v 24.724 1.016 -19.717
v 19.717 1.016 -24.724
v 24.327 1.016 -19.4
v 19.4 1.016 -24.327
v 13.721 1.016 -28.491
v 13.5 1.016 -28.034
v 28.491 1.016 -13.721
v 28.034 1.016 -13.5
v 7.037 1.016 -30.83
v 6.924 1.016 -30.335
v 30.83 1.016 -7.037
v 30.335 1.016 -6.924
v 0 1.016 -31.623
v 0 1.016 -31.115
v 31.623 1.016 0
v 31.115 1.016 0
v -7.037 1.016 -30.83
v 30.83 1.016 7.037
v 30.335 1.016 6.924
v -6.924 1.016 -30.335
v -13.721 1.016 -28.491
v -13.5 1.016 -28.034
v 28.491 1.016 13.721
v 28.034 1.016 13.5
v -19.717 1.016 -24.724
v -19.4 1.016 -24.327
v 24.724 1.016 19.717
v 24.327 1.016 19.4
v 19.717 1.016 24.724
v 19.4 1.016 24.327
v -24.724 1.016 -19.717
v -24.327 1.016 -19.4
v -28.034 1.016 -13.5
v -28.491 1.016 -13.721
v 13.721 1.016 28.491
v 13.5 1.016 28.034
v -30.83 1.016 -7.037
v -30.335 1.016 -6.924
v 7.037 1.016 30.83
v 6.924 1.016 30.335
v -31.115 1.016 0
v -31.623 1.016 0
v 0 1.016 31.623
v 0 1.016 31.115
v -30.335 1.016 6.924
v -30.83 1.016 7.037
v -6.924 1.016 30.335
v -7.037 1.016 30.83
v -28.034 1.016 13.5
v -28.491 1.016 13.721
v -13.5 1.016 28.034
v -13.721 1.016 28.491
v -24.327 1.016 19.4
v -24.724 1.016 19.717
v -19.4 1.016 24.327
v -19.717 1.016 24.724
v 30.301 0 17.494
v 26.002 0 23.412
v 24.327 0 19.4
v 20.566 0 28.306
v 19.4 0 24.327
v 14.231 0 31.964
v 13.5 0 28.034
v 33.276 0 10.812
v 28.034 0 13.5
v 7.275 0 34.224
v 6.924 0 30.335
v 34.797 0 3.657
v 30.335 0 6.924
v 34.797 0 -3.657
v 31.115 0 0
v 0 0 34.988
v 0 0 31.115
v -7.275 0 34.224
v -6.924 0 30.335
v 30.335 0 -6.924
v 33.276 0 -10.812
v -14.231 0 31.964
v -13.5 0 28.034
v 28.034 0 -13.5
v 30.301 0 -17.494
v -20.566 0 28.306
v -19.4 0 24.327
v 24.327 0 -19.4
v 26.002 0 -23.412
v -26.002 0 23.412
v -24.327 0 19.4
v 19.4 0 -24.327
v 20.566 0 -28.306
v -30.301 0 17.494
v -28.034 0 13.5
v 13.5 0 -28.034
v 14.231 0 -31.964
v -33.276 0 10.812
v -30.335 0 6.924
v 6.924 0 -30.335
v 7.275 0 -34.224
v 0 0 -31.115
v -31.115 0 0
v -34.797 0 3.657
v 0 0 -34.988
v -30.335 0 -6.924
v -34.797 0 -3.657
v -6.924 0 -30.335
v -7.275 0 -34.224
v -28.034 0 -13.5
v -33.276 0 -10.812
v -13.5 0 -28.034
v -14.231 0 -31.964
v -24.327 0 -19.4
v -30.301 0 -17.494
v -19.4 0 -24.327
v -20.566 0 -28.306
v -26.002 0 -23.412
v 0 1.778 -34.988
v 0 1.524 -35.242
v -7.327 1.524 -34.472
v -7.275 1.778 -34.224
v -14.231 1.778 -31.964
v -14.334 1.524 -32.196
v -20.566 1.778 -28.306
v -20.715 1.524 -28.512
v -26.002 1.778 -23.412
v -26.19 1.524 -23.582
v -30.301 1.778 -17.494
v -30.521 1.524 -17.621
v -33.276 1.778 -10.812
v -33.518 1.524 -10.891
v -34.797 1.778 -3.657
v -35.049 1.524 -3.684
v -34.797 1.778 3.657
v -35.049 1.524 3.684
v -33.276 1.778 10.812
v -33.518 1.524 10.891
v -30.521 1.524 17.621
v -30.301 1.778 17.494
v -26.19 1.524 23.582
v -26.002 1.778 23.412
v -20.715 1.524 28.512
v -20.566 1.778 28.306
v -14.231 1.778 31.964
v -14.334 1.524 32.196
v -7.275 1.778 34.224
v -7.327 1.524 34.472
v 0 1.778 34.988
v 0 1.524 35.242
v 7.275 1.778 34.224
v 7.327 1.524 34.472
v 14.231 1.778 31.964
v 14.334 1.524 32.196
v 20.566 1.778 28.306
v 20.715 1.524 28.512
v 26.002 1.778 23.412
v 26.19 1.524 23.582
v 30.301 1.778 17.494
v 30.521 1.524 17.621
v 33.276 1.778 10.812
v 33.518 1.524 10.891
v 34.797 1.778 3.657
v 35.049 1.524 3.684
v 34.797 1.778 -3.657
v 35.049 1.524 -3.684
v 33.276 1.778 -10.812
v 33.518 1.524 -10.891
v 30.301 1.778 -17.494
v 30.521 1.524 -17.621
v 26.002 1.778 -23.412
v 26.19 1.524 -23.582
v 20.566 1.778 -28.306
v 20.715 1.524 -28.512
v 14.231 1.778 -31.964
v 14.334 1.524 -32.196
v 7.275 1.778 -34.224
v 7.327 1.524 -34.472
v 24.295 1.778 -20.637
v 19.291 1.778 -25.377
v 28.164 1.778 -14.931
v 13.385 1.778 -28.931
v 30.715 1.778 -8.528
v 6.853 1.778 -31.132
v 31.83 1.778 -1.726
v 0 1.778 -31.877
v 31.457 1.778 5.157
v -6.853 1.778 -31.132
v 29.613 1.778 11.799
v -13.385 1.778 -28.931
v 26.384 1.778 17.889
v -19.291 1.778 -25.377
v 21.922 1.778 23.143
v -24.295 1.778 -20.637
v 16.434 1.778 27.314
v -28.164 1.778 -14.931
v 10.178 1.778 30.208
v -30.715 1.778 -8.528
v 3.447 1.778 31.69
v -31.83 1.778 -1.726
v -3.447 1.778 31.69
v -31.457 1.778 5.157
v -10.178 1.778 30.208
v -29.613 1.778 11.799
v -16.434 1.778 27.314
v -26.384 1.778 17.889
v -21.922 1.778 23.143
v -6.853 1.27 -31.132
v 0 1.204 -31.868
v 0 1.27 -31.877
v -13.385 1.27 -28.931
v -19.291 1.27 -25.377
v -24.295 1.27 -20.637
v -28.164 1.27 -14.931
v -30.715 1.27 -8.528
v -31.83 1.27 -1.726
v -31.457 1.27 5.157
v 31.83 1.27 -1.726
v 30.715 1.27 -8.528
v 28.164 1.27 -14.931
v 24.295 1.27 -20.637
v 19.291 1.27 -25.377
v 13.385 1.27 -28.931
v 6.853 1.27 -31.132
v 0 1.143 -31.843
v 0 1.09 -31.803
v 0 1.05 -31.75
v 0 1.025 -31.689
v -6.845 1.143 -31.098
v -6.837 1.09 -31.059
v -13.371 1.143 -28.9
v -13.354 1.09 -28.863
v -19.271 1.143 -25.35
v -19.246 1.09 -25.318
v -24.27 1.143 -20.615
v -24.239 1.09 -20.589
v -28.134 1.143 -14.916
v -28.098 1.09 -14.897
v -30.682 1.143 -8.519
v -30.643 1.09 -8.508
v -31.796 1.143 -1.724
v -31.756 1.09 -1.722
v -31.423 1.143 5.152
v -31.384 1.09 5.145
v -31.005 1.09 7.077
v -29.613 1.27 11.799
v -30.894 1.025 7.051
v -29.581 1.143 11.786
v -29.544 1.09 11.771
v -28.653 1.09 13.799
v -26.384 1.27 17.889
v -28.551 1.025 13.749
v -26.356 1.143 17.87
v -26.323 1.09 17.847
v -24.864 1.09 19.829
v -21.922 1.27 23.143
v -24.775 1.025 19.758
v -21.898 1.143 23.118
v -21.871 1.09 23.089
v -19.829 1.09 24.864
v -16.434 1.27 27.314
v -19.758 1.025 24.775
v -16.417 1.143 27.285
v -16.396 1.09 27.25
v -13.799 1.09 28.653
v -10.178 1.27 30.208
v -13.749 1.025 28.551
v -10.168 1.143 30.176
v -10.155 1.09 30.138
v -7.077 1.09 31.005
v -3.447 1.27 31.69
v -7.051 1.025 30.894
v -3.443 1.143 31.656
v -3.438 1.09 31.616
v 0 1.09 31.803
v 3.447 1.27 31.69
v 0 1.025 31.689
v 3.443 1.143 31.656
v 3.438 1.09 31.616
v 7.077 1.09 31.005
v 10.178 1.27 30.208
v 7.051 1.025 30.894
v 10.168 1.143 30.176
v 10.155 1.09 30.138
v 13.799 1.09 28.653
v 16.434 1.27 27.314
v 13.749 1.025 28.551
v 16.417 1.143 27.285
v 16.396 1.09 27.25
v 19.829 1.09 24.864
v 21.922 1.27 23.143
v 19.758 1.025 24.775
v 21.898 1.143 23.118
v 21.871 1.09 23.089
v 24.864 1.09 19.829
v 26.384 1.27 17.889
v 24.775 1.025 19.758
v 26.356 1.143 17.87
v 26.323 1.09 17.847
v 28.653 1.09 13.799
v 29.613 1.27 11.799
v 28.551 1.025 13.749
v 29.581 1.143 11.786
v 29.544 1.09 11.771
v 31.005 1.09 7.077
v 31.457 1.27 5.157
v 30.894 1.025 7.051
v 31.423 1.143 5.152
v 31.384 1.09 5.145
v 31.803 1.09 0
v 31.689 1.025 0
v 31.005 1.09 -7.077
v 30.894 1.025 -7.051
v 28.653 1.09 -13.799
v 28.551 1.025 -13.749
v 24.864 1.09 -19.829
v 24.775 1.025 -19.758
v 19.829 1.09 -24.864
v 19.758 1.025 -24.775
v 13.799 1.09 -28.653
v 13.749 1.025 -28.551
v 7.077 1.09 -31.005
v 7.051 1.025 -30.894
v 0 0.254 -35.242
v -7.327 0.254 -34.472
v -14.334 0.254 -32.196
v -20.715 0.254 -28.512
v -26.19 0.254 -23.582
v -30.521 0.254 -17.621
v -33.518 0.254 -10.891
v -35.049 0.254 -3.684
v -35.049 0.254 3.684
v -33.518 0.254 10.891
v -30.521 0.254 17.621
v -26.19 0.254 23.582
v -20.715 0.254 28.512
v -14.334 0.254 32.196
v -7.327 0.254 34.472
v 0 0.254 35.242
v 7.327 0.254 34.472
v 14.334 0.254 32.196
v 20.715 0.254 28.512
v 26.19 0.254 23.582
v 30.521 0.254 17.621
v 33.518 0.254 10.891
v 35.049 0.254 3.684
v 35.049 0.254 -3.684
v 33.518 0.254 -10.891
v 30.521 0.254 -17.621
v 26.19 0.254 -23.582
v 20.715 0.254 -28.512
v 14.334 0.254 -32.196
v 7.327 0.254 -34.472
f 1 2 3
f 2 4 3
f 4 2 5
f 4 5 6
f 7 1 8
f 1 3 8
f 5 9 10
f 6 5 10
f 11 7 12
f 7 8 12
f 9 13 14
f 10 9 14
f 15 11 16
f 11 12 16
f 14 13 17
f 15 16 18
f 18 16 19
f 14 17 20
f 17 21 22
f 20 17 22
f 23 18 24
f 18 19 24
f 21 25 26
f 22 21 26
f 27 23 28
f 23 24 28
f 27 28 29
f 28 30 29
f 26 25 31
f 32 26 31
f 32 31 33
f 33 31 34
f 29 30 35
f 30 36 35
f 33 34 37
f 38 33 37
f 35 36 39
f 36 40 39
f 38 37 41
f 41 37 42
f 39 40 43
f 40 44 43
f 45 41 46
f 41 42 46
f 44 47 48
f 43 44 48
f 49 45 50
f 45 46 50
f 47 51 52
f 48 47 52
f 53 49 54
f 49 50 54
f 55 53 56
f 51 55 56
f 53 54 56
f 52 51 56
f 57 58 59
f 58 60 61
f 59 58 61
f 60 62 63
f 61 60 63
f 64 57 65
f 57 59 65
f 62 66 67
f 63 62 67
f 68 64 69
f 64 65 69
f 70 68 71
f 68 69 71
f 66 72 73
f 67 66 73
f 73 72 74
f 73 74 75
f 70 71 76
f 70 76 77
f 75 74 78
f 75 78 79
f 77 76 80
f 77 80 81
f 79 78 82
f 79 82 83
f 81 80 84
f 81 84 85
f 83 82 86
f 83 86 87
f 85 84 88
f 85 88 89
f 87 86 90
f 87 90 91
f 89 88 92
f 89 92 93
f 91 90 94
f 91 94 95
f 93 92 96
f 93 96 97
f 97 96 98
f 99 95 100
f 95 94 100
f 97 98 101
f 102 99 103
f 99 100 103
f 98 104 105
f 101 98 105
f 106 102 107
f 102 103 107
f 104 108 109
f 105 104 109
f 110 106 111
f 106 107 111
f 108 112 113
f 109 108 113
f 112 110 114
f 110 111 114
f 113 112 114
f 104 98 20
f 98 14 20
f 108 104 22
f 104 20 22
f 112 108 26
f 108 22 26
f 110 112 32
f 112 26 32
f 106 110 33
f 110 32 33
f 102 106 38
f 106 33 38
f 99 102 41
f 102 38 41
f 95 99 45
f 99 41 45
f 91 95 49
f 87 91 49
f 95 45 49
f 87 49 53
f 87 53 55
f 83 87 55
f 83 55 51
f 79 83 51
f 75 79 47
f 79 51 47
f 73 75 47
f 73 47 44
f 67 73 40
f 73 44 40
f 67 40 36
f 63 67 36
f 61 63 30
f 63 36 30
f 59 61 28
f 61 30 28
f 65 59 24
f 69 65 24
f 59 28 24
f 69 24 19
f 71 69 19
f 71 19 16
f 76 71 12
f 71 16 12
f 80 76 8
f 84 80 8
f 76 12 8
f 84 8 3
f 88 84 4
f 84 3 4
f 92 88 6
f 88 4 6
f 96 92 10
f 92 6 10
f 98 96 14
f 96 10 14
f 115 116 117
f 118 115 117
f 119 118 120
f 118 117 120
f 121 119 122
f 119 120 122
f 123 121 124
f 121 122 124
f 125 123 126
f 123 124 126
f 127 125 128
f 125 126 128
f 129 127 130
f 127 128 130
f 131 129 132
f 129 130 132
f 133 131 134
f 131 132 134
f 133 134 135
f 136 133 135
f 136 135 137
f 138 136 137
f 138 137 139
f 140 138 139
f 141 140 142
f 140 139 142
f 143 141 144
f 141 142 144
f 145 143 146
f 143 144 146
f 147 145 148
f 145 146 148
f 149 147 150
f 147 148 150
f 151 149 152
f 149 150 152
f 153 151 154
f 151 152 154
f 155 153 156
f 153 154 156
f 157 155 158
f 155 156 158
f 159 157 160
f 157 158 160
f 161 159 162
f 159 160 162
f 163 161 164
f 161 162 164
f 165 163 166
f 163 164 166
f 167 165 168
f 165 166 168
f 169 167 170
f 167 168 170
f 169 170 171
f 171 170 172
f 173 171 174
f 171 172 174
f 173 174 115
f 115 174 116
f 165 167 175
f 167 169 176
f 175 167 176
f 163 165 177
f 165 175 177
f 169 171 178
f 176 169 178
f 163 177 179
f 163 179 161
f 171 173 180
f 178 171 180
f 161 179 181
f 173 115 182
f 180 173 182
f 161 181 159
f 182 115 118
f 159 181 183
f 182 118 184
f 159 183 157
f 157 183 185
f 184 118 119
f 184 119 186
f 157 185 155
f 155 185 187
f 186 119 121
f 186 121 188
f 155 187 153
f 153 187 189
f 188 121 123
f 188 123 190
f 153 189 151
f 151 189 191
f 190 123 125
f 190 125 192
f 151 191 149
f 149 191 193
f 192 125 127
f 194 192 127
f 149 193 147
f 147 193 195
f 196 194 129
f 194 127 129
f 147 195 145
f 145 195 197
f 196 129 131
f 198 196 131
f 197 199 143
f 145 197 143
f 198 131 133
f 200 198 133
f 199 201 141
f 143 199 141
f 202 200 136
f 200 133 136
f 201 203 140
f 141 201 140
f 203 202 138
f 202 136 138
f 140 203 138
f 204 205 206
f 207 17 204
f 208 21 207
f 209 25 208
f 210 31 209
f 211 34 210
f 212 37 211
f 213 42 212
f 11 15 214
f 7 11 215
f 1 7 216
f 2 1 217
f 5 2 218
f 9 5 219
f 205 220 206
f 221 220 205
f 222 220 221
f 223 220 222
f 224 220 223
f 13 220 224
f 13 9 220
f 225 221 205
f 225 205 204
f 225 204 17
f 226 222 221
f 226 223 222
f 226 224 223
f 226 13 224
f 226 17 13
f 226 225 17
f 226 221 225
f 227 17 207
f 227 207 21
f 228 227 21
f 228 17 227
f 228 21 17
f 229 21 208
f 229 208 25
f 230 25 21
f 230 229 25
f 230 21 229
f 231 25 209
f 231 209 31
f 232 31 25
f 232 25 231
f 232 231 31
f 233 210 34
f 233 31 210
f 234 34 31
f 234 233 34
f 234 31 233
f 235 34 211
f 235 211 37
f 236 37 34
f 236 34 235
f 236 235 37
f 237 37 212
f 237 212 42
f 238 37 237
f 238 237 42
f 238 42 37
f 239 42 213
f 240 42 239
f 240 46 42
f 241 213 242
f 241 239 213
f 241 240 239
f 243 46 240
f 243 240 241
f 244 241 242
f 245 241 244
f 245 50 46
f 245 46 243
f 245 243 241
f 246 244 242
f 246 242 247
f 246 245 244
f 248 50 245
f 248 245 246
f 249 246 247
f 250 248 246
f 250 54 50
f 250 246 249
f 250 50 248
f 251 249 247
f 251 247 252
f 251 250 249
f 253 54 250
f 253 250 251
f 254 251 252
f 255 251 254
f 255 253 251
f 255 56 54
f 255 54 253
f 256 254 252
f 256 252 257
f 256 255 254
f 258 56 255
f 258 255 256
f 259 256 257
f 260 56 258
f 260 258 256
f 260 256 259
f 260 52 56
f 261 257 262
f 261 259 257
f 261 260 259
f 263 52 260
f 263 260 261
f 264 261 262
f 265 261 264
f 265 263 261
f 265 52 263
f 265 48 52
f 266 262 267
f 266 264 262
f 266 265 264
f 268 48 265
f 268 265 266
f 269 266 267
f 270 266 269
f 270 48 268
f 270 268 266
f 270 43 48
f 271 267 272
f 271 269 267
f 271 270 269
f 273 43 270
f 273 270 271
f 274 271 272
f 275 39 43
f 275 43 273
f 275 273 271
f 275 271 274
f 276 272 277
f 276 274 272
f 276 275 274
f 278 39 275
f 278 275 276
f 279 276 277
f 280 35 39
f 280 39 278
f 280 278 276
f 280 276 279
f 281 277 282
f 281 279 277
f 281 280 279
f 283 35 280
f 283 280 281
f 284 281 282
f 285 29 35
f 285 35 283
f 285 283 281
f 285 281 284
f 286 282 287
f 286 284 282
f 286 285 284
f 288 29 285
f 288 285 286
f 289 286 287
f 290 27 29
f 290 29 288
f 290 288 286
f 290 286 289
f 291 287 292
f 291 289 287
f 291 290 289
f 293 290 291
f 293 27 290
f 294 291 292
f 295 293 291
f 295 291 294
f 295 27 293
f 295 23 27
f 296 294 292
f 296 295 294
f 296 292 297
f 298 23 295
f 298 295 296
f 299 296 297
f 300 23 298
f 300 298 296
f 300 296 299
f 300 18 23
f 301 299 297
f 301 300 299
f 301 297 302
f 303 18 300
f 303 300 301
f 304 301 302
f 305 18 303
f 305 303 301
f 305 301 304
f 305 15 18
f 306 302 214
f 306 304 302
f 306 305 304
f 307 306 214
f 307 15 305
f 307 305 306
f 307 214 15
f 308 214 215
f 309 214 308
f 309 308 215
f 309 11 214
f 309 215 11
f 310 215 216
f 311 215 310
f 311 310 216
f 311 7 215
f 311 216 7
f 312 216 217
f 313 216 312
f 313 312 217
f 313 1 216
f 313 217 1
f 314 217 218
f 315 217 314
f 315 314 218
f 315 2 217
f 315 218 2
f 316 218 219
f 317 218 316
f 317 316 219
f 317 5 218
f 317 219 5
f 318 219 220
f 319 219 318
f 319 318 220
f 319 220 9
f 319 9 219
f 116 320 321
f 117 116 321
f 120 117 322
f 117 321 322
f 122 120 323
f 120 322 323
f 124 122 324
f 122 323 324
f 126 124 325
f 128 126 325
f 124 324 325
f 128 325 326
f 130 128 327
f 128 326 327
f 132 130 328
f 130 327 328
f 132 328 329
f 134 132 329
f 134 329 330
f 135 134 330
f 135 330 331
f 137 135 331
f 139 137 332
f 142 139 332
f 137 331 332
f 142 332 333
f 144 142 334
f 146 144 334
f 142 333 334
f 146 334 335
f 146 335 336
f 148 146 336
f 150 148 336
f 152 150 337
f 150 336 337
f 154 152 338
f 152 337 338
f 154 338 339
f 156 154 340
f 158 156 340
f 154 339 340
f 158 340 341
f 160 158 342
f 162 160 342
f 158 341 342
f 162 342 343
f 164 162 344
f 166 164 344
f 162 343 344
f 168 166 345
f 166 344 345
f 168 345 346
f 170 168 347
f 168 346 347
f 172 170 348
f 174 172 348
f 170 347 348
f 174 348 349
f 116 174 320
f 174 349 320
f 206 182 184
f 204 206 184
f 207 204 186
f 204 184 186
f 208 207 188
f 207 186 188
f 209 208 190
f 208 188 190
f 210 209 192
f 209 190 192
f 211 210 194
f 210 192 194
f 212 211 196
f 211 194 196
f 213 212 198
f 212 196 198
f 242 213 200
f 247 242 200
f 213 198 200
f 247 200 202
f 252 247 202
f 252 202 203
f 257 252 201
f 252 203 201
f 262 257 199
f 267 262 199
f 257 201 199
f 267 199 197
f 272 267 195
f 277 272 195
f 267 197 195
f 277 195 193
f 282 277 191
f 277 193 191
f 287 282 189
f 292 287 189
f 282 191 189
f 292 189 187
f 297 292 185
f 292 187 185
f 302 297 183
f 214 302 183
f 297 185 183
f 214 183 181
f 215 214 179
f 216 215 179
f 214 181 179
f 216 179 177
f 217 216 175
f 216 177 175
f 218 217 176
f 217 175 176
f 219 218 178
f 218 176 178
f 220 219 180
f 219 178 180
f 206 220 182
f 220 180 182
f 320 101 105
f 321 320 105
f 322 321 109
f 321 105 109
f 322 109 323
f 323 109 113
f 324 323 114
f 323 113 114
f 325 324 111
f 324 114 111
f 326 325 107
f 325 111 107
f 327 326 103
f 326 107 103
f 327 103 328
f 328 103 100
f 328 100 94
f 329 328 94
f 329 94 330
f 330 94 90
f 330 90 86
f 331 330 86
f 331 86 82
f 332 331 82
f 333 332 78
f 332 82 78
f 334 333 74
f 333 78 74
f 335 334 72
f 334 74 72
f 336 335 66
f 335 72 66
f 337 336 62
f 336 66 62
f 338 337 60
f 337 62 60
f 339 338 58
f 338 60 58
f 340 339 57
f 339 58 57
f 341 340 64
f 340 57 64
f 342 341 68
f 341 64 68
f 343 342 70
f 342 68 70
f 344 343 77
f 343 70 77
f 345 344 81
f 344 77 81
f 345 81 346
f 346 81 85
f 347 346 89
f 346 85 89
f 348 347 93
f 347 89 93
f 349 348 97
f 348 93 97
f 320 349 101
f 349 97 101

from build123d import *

# Parameters (mm, degrees)
OUTER_CHAMFER_SIZE = 0.254
INNER_FILLET_R     = 0.254


with BuildPart() as part:
    # Primary Sketch → Primary Revolve (revolve)
    with BuildSketch(Plane.XY, mode=Mode.PRIVATE) as primary_revolve_sk:
        Polygon((31.115, 0), (31.115, 1.016), (31.877, 1.016), (31.877, 1.778), (35.2425, 1.778), (35.2425, 0), align=None)
    revolve(primary_revolve_sk.sketch.rotate(Axis((0, 0, 0), (0, 1, 0)), 90), axis=Axis((0, 0, 0), (0, 1, 0)))

    # Outer Chamfer
    outer_chamfer_edges = [part.edges().sort_by_distance(p)[0] for p in [
        (0, 0, 35.2425),
        (0, 1.778, 35.2425),
    ]]
    chamfer(outer_chamfer_edges, length=OUTER_CHAMFER_SIZE)

    # Inner Fillet
    inner_fillet_edges = [part.edges().sort_by_distance(p)[0] for p in [
        (0, 1.016, 31.877),
    ]]
    fillet(inner_fillet_edges, radius=INNER_FILLET_R)


solid = part.part
